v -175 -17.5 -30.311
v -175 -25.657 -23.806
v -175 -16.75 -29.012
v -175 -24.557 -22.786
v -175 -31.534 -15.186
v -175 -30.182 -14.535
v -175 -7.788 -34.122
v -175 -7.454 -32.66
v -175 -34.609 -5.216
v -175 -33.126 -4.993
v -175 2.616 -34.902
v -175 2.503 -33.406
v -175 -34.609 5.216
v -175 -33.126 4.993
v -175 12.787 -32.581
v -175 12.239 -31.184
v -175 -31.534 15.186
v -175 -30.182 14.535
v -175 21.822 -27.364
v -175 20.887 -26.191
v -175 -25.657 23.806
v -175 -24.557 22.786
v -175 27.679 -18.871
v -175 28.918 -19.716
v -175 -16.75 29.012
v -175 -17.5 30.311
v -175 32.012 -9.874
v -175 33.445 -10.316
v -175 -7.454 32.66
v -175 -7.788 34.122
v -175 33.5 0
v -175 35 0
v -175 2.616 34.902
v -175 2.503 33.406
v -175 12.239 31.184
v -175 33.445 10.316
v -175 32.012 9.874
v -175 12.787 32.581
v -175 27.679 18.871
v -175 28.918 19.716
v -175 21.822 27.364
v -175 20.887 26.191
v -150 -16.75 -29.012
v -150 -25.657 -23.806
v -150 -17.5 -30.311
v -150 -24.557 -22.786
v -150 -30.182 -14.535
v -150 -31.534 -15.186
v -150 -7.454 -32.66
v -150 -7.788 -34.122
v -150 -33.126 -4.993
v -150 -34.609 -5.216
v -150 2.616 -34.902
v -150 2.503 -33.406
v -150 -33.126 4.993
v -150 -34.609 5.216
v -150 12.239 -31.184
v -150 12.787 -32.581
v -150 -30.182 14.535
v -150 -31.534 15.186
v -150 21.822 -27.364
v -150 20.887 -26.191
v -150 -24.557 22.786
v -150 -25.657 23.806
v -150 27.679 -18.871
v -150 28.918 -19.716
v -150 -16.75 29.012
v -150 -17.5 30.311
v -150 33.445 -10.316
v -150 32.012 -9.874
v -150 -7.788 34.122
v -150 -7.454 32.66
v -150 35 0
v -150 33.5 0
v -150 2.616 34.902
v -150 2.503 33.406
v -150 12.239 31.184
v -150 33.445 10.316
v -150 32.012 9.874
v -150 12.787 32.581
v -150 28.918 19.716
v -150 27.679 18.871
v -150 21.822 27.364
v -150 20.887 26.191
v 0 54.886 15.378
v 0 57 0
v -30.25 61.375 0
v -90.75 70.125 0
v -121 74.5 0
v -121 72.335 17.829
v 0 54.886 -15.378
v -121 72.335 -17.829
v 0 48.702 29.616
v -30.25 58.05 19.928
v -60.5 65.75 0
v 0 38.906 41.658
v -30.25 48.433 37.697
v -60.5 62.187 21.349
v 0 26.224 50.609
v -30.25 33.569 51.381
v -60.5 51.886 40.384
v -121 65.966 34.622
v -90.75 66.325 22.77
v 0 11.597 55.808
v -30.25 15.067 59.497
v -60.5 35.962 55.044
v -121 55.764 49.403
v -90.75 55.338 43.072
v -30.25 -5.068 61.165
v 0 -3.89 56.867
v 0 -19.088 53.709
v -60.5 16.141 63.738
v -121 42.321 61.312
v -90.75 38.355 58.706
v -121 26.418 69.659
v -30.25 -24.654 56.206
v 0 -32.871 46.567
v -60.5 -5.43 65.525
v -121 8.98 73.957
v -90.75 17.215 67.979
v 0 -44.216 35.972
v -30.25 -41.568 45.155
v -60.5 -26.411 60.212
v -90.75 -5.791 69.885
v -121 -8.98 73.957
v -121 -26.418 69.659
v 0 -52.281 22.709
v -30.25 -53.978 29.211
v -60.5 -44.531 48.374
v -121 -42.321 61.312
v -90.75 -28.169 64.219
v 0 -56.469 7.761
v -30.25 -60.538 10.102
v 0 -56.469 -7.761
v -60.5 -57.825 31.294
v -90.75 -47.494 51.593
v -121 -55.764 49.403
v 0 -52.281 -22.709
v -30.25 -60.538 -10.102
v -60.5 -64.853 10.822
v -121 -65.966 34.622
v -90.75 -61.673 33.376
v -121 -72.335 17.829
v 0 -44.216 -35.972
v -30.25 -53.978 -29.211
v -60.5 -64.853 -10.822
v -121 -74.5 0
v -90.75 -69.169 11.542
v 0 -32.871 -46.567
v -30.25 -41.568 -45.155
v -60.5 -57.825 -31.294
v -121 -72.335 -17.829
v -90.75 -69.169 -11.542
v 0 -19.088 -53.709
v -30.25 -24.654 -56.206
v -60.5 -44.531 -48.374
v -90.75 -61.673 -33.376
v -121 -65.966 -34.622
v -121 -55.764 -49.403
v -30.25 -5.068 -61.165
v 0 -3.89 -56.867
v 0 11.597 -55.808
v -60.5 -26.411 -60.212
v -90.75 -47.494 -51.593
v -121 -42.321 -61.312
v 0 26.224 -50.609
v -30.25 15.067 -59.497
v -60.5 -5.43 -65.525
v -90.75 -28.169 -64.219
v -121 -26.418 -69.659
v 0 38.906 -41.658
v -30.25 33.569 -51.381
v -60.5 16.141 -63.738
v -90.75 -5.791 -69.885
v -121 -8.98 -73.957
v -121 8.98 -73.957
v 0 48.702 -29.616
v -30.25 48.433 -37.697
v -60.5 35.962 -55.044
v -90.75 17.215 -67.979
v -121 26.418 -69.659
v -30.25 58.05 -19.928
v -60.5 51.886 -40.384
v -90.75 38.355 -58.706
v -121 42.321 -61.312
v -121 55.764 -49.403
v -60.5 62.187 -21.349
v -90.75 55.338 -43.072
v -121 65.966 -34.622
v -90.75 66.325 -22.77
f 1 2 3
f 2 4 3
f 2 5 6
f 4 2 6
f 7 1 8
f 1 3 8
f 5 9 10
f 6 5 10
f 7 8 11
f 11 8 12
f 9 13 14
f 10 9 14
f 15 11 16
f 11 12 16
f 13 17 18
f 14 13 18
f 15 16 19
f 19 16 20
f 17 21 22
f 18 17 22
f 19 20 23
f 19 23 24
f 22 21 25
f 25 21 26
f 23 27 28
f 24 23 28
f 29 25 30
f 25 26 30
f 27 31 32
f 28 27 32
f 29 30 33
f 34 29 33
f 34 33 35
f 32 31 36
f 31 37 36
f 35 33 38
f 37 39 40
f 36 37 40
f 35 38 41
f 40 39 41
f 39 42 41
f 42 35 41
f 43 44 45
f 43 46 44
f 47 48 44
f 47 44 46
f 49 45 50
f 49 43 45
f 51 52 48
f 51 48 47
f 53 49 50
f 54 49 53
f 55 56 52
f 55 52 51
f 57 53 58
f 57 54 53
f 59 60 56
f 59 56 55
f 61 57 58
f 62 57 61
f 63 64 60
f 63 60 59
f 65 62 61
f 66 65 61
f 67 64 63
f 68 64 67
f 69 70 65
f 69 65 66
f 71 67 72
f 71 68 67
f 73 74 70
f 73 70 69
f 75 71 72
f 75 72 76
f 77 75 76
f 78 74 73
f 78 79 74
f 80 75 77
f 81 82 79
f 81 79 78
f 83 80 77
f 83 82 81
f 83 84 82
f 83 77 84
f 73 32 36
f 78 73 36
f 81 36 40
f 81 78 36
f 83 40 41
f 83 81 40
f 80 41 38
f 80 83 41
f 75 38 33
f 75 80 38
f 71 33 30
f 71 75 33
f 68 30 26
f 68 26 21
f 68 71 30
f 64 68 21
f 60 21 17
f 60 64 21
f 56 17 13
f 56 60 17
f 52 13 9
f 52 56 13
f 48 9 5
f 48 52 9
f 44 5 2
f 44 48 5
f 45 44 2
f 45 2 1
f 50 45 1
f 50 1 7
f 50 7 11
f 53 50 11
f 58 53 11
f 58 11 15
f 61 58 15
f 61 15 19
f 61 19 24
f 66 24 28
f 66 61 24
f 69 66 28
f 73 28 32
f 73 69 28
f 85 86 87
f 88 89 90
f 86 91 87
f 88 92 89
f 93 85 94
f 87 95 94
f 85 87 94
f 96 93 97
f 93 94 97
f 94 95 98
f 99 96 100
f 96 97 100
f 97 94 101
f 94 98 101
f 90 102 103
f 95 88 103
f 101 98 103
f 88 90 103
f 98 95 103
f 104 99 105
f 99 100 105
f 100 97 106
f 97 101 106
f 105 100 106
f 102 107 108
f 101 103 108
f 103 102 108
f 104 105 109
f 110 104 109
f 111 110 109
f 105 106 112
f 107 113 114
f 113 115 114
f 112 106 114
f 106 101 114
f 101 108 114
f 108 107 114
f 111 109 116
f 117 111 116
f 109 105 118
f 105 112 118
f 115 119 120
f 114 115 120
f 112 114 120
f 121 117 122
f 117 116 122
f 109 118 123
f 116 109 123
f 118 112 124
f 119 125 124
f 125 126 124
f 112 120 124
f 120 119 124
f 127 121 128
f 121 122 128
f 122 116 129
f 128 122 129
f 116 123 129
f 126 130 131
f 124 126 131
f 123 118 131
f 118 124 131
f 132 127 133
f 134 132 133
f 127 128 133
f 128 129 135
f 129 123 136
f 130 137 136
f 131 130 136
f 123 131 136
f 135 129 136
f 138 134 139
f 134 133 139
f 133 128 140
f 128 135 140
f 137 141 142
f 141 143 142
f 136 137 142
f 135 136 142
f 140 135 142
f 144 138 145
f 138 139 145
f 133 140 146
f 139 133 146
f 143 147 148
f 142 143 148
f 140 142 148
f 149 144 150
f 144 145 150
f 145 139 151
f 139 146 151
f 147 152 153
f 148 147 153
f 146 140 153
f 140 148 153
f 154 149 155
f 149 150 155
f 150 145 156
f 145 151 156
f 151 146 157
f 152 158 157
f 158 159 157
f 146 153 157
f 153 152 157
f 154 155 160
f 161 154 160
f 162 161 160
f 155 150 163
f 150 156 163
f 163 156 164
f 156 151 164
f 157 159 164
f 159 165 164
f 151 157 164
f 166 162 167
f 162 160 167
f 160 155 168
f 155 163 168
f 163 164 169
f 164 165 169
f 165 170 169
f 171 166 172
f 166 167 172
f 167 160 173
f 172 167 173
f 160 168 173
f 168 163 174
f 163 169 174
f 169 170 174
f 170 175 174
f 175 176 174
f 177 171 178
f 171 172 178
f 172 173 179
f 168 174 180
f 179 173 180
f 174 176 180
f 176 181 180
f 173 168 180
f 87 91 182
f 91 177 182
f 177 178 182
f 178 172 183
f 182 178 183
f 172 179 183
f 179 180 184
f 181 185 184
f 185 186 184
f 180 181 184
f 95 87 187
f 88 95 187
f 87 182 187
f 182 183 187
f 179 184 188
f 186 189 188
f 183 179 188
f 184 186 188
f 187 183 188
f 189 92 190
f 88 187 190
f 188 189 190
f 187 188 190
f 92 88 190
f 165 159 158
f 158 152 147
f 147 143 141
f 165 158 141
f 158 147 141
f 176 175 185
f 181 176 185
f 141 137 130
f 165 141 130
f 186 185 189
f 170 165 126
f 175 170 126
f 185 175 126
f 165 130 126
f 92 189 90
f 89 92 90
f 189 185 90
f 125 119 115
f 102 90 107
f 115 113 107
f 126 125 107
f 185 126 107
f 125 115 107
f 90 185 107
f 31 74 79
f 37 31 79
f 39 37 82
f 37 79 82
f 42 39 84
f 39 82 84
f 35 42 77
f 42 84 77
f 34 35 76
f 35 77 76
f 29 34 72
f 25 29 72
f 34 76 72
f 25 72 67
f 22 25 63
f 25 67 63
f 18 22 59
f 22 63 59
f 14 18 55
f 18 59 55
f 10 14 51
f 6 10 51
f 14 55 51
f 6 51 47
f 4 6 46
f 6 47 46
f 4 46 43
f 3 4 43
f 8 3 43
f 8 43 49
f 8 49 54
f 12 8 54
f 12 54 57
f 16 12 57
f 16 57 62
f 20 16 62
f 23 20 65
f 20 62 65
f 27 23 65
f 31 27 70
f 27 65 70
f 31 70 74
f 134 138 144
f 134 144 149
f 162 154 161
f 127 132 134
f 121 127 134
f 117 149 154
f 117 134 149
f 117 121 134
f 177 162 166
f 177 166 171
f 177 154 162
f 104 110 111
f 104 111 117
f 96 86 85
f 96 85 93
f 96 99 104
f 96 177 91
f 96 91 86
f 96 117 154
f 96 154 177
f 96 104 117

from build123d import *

# Parameters (mm, degrees)
F5_R     = 35
F5_R_2   = 33.5
F6_DEPTH = 25
F0_R     = 57
F2_R     = 74.5


with BuildPart() as f6:
    # F5 (on offset) → F6 (new body, through all)
    with BuildSketch(Plane.YZ.offset(-150)):
        Circle(F5_R)
        Circle(F5_R_2, mode=Mode.SUBTRACT)
    extrude(amount=-F6_DEPTH)


with BuildPart() as f7:
    # F0 (on Right) → F7 section 0
    with BuildSketch(Plane.YZ):
        Circle(F0_R)
    # F2 (on offset) → F7 section 1
    with BuildSketch(Plane.YZ.offset(-121)):
        Circle(F2_R)
    loft()


solid = Compound([f6.part, f7.part])
